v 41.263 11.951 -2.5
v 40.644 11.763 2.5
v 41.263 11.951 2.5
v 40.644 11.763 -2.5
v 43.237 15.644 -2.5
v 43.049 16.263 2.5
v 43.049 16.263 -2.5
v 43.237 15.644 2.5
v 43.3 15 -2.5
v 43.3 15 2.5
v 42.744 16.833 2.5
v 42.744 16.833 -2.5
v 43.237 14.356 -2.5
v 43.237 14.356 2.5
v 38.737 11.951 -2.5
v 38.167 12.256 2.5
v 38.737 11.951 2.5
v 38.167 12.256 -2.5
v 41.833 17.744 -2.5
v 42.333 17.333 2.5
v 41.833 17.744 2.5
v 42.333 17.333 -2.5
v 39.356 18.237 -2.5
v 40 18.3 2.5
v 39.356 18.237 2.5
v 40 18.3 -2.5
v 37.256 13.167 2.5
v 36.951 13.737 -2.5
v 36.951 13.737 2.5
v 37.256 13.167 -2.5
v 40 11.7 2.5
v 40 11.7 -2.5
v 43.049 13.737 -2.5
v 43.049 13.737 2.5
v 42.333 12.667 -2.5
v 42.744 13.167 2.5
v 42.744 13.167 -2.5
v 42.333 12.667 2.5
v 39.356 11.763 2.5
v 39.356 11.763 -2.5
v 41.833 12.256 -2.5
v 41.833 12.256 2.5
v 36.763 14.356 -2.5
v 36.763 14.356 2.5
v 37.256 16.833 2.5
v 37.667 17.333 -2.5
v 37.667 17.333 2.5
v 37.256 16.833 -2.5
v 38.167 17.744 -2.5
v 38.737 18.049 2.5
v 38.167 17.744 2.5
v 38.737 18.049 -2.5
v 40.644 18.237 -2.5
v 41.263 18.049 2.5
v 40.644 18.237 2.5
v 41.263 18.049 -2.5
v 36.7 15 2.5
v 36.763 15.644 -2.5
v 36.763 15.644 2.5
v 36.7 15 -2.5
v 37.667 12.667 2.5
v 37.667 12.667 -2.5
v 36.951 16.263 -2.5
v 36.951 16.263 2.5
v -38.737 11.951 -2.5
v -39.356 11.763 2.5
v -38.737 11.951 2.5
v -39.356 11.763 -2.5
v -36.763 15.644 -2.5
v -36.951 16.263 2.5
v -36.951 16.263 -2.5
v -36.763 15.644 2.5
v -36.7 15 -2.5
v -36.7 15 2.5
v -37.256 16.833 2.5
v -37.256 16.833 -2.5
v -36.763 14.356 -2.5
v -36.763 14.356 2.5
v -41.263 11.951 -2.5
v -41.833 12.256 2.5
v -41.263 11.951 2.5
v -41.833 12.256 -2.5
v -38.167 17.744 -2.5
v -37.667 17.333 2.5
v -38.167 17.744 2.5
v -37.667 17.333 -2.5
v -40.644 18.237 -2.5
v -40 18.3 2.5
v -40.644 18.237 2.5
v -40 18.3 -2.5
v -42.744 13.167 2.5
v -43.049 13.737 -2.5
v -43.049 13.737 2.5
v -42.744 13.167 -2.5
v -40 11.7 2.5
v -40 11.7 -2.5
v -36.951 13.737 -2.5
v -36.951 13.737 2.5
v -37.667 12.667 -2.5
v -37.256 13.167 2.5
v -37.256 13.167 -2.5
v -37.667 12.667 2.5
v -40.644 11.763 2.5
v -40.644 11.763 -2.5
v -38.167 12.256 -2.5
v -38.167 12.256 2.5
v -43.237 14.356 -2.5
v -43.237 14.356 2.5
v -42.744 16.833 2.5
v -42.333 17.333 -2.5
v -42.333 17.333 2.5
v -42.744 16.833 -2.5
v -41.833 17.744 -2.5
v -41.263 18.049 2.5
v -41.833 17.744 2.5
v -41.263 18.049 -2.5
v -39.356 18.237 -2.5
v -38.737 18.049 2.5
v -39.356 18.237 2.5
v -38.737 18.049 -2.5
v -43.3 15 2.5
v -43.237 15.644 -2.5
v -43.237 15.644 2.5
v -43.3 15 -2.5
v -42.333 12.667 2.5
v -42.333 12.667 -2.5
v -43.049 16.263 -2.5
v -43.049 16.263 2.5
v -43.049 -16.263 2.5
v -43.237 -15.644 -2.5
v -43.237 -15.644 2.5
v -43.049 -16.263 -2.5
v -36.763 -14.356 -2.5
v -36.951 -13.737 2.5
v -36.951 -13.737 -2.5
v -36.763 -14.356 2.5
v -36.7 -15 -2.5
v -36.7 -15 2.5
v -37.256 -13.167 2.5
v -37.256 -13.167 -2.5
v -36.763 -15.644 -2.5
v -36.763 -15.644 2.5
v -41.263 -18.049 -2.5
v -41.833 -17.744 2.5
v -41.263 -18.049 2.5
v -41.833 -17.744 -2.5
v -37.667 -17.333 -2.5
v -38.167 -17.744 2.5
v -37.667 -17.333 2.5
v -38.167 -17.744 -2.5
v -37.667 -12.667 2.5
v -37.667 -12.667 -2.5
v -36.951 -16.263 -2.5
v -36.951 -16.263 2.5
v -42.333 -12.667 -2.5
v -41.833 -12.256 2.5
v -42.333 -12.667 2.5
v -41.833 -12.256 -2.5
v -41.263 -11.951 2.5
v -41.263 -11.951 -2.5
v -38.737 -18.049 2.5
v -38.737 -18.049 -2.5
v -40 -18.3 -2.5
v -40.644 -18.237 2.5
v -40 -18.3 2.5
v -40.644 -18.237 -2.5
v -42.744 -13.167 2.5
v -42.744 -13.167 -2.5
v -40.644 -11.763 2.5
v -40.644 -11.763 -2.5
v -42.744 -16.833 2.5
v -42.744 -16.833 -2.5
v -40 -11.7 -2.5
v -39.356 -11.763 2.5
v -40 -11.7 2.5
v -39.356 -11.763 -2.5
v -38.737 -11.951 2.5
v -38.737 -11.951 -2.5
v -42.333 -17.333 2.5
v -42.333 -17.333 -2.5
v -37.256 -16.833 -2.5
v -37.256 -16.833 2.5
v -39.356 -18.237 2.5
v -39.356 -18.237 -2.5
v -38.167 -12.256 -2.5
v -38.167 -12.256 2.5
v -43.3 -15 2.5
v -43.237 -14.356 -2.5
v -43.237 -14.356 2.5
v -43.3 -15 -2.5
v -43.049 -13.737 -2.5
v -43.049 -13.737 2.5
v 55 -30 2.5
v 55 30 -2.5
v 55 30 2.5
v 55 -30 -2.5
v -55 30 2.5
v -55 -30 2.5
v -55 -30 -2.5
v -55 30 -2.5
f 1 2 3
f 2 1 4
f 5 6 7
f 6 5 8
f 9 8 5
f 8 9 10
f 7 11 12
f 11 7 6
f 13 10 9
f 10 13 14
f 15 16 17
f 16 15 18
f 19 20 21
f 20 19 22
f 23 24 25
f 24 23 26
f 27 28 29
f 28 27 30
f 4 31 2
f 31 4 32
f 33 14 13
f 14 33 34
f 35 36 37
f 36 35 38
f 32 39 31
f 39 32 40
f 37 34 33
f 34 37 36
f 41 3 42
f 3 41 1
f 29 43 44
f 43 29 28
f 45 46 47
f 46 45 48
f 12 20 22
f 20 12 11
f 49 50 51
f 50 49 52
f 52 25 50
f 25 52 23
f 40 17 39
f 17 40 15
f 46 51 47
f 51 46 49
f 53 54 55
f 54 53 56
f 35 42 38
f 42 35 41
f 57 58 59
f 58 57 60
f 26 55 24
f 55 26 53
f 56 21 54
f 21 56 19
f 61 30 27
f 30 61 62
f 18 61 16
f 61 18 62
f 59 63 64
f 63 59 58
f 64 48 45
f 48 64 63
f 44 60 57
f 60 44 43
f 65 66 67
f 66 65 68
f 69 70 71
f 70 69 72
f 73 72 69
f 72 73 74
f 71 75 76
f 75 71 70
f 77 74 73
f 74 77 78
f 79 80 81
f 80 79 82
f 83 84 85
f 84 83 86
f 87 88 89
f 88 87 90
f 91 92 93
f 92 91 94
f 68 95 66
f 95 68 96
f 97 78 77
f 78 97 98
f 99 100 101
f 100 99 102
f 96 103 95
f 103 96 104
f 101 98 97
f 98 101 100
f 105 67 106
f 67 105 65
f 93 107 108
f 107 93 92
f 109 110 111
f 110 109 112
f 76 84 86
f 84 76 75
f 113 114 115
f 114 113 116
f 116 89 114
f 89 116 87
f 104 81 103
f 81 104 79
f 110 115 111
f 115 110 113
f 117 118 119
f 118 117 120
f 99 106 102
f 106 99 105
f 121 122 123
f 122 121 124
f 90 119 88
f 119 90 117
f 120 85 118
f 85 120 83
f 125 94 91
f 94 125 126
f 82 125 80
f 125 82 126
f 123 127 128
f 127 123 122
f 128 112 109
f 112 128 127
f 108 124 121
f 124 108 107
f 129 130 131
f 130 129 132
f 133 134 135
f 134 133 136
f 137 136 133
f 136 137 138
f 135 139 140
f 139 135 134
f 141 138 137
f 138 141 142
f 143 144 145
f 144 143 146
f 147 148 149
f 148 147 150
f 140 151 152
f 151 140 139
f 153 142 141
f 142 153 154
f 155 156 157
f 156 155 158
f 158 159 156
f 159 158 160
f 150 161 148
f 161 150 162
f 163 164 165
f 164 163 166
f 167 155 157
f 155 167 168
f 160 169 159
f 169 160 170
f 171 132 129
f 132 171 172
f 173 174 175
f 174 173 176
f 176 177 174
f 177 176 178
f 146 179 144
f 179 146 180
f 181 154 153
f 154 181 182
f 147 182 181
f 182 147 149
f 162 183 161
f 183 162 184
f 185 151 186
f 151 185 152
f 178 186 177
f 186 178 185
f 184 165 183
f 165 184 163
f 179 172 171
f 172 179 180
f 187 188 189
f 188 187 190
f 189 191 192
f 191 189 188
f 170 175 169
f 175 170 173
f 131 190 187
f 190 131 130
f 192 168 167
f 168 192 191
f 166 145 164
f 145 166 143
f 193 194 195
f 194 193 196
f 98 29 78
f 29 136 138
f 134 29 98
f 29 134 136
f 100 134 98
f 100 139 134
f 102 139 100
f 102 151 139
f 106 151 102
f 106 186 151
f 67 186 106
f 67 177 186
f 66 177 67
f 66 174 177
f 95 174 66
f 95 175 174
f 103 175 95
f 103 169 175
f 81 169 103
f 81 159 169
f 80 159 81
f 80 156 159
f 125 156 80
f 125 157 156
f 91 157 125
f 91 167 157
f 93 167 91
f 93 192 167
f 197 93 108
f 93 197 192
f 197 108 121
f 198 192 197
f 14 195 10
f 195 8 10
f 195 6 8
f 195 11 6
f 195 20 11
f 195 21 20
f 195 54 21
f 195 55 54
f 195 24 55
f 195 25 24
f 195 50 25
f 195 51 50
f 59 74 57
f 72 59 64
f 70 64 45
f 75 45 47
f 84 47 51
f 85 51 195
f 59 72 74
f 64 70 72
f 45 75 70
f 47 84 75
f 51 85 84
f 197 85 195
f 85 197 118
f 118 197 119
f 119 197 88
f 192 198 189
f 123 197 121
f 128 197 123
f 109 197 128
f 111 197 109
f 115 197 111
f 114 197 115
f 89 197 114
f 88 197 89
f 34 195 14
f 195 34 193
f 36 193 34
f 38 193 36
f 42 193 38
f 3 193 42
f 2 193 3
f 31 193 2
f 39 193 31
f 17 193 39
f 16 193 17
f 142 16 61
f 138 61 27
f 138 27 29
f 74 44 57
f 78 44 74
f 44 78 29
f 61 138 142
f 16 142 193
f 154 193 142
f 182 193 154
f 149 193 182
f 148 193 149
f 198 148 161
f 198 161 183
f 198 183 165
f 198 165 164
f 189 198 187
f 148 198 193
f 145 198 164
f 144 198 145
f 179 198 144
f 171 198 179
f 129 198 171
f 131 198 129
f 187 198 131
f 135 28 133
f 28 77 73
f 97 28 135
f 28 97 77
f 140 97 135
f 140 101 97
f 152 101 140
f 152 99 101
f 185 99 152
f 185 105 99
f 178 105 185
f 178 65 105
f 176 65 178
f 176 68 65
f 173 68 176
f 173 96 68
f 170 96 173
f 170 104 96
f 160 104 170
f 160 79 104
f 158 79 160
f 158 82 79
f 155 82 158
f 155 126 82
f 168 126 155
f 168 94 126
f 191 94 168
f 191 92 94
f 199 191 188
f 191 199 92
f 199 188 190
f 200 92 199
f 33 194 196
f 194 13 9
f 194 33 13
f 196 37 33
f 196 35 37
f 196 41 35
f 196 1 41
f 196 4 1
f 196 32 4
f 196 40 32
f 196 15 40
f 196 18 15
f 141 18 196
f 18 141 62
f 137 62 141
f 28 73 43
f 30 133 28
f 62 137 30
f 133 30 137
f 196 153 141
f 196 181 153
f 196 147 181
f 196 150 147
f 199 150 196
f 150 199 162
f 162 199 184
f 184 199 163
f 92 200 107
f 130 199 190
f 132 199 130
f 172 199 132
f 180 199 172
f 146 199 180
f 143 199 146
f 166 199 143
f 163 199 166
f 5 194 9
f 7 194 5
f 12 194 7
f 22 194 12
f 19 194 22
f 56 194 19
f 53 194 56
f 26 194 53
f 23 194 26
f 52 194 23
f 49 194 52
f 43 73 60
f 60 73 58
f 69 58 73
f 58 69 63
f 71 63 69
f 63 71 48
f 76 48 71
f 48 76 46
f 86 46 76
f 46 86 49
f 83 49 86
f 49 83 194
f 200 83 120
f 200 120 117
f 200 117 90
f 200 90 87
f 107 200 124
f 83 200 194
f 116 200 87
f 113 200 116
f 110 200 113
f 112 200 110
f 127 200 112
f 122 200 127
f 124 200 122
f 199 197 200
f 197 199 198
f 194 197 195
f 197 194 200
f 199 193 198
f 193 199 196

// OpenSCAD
$fn = 32;

// ----------------------------------------------------------------------
// Corner plate 110 x 60 x 5
// 3 holes, centres taken from the edge offset
// ----------------------------------------------------------------------

// --- parameters (mm) ---
plate = [110, 60, 5];  // overall size (x, y, z)
holes = 3;             // number of holes the drawing asks for
hole_d = 6.6;          // hole diameter
edge = 15;             // hole centre offset from the plate edge

// --- derived feature positions (mm) ---
corner_x = plate[0] / 2 - edge;  // = 40   corner hole X
corner_y = plate[1] / 2 - edge;  // = 15   corner hole Y
feature_centers = [
  [corner_x, corner_y],
  [-corner_x, corner_y],
  [-corner_x, -corner_y]
];   // hole centres the loop below drills

// plate outline, every hole drilled through with the same cutters
difference() {
  cube(plate, center = true);
  for (centre = feature_centers)
    translate([centre[0], centre[1], 0])
      cylinder(d = hole_d, h = plate[2] + 2, center = true);
}
